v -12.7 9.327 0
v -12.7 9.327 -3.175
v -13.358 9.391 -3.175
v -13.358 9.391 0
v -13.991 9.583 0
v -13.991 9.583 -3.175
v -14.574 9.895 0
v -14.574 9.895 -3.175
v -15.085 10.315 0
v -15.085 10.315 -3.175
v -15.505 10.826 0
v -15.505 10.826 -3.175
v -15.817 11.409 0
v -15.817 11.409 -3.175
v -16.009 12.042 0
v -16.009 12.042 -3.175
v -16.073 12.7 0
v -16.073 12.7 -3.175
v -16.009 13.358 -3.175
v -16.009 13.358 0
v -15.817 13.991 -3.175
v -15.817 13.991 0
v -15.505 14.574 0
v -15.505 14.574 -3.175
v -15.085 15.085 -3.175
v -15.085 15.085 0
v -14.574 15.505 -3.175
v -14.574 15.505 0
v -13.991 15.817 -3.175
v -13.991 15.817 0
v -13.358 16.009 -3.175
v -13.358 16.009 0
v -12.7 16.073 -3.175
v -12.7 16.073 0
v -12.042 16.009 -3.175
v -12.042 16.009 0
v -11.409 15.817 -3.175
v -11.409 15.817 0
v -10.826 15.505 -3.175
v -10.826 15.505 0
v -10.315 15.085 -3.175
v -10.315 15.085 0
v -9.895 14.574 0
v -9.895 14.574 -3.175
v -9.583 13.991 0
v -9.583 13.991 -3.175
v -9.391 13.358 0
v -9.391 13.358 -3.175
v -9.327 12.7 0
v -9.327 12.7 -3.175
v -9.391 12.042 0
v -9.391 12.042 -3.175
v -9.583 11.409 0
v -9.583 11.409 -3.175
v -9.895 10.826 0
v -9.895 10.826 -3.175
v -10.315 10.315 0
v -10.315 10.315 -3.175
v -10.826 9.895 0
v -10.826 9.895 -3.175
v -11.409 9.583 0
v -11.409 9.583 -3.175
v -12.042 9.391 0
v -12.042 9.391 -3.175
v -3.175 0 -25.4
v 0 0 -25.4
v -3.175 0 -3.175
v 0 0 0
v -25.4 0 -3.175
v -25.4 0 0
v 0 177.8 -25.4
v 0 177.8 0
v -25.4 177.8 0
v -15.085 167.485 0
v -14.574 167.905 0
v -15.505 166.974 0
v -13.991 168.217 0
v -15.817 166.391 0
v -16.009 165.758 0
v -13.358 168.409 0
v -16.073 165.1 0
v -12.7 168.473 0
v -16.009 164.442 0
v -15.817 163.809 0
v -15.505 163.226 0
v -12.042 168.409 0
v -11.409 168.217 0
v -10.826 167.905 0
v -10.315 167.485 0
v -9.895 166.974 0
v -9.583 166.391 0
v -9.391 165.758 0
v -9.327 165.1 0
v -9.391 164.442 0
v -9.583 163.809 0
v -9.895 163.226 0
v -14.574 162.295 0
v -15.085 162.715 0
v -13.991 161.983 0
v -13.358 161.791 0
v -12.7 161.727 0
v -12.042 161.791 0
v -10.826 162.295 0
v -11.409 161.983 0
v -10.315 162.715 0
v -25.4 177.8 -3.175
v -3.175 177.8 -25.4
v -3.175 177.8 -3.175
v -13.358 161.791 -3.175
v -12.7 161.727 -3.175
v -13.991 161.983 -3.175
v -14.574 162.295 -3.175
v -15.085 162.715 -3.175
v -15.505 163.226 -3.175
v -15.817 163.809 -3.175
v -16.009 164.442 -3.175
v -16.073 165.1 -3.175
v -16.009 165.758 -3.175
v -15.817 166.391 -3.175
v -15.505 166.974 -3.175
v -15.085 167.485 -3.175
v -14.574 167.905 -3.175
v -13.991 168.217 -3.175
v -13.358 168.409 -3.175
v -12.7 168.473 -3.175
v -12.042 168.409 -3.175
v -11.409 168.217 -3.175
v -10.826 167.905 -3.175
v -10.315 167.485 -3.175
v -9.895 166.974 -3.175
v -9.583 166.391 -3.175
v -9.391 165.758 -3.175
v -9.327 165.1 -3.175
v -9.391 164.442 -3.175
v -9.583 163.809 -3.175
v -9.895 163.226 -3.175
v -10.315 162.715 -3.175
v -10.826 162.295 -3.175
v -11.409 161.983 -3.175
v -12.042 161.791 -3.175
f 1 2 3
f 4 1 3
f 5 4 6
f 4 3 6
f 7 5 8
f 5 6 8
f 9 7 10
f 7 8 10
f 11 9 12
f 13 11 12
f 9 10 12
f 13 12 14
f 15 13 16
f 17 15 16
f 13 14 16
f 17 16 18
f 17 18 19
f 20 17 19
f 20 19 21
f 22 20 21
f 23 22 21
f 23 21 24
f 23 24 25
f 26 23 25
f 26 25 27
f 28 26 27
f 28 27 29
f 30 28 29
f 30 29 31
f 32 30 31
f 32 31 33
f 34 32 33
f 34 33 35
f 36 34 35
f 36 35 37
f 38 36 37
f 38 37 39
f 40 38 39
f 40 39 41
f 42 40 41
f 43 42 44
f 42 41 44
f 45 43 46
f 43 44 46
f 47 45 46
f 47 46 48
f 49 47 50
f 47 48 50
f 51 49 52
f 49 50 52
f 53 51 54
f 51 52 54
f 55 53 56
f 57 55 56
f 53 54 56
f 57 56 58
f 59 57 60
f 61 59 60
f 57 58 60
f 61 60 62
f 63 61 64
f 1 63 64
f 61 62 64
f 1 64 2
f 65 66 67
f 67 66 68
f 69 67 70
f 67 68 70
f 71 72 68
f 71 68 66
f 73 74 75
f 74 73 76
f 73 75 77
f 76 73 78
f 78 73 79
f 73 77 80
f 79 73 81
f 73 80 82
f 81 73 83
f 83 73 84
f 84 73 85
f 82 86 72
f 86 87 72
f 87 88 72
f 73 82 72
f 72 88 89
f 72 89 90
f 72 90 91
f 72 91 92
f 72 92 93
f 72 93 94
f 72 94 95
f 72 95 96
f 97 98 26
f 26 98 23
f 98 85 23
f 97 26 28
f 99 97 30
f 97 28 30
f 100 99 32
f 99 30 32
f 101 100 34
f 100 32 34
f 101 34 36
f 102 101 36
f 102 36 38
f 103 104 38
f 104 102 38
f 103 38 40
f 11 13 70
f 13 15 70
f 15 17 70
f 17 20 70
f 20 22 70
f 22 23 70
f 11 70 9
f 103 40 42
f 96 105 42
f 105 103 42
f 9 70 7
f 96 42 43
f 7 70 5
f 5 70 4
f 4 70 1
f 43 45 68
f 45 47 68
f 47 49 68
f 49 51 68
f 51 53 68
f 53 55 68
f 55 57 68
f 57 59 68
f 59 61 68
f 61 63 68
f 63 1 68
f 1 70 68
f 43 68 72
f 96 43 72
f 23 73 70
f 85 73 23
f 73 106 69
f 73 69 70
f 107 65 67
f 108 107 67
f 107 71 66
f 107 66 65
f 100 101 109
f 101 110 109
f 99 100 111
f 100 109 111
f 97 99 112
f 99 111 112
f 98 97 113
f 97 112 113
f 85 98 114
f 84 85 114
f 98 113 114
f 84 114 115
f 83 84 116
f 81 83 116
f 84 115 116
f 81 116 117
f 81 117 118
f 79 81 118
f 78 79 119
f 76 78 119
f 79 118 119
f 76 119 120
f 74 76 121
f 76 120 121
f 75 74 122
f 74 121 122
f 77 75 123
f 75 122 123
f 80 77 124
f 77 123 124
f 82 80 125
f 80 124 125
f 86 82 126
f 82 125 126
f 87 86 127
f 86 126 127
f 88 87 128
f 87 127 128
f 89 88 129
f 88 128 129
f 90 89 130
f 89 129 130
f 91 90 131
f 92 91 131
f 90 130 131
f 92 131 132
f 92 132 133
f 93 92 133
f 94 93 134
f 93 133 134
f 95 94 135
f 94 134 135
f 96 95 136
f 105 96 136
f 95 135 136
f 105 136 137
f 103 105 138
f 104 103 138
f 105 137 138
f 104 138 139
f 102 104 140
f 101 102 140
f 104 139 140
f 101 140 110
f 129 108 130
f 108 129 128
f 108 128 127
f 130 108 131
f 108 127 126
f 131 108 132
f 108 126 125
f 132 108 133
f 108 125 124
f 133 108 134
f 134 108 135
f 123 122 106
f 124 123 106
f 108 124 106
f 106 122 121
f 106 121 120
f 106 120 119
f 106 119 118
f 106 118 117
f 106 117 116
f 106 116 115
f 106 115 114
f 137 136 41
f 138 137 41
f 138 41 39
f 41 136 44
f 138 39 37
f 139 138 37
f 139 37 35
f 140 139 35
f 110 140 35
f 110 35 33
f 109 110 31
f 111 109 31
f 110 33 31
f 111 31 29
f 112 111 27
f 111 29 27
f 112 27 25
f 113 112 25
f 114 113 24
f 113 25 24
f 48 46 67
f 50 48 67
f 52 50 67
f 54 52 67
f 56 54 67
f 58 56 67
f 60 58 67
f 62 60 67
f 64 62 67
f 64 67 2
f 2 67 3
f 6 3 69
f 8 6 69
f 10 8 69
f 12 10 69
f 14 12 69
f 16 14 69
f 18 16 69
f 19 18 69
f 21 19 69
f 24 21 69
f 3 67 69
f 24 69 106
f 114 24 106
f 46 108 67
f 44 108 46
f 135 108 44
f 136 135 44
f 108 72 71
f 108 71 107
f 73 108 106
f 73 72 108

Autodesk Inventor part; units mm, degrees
ref_plane "YZ Plane" through (0, 0, 0) normal (1, 0, 0) x (0, 1, 0)
ref_plane "XZ Plane" through (0, 0, 0) normal (0, 1, 0) x (-1, 0, 0)
ref_plane "XY Plane" through (0, 0, 0) normal (0, 0, 1) x (1, 0, 0)
sketch "Sketch1" plane through (0, 0, 0) normal (0, 1, 0) x (-1, 0, 0)
  line L0 (0, 0) -> (0, -25.4)
  line L1 (0, -25.4) -> (3.175, -25.4)
  line L2 (3.175, -25.4) -> (3.175, -3.175)
  line L3 (3.175, -3.175) -> (25.4, -3.175)
  line L4 (25.4, -3.175) -> (25.4, 0)
  line L5 (25.4, 0) -> (0, 0)
  dimension "d0" = 3.175
  dimension "d1" = 3.175
  dimension "d2" = 25.4
  dimension "d3" = 25.4
extrude "Extrusion1" add sketch "Sketch1" along normal blind 177.8
sketch "Sketch2" plane through (-25.4, 0, 0) normal (0, 0, 1) x (1, 0, 0)
  line L0 (0, 177.8) -> (25.4, 177.8) projected
  line L1 (0, 0) -> (25.4, 0) projected
  line L2 (0, 0) -> (0, 177.8) projected
  point P0 (12.7, 165.1)
  point P1 (12.7, 12.7)
  dimension "d6" = 12.7
  dimension "d7" = 12.7
  dimension "d8" = 12.7
  dimension "d9" = 12.7
hole "Hole1" at (-12.7, 165.1, 0) at (-12.7, 12.7, 0) direction (0, 0, -1) diameter 6.7469 end through all
properties part number "15102898-16-P-0312"
